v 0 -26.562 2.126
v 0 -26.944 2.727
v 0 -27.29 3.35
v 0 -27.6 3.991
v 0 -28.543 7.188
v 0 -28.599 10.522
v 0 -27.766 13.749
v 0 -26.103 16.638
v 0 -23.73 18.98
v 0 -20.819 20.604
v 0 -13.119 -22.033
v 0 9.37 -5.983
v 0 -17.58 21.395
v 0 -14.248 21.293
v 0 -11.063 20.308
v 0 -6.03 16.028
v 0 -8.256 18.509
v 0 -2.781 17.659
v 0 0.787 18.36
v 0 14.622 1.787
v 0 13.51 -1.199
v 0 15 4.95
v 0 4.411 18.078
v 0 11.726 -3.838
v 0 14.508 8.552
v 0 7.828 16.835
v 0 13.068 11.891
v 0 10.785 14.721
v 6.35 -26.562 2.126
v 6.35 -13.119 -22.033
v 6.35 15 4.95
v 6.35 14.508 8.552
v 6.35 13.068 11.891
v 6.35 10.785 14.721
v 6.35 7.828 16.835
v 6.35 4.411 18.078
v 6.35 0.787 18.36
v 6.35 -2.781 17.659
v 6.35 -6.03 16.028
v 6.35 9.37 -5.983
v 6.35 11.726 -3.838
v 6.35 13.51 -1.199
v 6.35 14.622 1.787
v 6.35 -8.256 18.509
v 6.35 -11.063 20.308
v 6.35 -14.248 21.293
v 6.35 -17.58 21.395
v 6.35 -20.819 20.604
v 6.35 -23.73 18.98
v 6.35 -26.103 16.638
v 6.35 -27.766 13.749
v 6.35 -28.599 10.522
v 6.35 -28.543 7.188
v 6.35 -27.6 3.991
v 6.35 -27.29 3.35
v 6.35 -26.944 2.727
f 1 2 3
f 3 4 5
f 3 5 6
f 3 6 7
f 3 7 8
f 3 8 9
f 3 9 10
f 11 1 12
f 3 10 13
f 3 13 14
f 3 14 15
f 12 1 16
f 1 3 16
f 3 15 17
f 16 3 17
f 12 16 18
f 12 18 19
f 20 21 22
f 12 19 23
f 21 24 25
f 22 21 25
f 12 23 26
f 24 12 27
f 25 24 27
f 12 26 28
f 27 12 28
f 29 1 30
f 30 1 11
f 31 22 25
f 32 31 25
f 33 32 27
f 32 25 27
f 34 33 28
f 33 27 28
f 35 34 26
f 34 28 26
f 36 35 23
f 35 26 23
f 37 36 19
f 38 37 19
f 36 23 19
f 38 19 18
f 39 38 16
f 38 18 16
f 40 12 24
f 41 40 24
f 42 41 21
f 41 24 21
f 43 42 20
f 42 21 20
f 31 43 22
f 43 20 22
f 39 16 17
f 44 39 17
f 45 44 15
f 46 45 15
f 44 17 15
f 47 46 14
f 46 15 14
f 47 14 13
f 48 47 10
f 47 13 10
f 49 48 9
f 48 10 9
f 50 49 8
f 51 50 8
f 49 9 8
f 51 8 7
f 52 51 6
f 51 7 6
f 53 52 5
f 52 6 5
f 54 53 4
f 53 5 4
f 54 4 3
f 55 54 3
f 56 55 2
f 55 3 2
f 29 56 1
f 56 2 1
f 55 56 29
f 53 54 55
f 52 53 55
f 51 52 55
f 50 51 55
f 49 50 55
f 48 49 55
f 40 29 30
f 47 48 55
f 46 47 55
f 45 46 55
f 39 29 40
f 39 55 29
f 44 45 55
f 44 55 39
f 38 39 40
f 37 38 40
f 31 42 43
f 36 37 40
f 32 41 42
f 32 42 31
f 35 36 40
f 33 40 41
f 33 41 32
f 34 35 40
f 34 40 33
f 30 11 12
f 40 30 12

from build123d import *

# Parameters (mm, degrees)
F1_DEPTH = 25.4
F2_SCALE = 0.25


with BuildPart() as f1:
    # F0 (on Right) → F1 (new body)
    with BuildSketch(Plane.YZ):
        with BuildLine():
            ThreePointArc((-110.3992487095, 15.9628562986), (-108.4846328784, 12.1435644545), (-106.2483957789, 8.5032365015))
            Line((-106.2483957789, 8.5032365015), (-110.3992487095, 15.9628562986))
        make_face()
        with BuildLine():
            ThreePointArc((-24.1195932903, 64.1108403944), (-46.0880198127, 31.8647754474), (-40.4449835973, -6.7432109118))
            ThreePointArc((-40.4449835973, -6.7432109118), (-22.2285273136, 11.4155651853), (-15.5582582091, 36.2568199635))
            ThreePointArc((-15.5582582091, 36.2568199635), (-17.7468872986, 50.8268483826), (-24.1195932903, 64.1108403944))
        make_face()
        with BuildLine():
            Line((-52.4756349623, -88.1333723664), (37.4816562158, -23.9329912189))
            ThreePointArc((37.4816562158, -23.9329912189), (-5.3042368908, -32.6670185732), (-40.4449835973, -6.7432109118))
            ThreePointArc((-40.4449835973, -6.7432109118), (-76.3437133157, -12.0550910847), (-106.2483957789, 8.5032365015))
            Line((-106.2483957789, 8.5032365015), (-52.4756349623, -88.1333723664))
        make_face()
        with BuildLine():
            ThreePointArc((-106.2483957789, 8.5032365015), (-76.3437133157, -12.0550910847), (-40.4449835973, -6.7432109118))
            ThreePointArc((-40.4449835973, -6.7432109118), (-46.0880198127, 31.8647754474), (-24.1195932903, 64.1108403944))
            ThreePointArc((-24.1195932903, 64.1108403944), (-89.3162249481, 79.5619391689), (-110.3992487095, 15.9628562986))
            Line((-110.3992487095, 15.9628562986), (-106.2483957789, 8.5032365015))
        make_face()
        with BuildLine():
            ThreePointArc((-40.4449835973, -6.7432109118), (-5.3042368908, -32.6670185732), (37.4816562158, -23.9329912189))
            ThreePointArc((37.4816562158, -23.9329912189), (54.0392417852, -4.7941657865), (59.9991728249, 19.8011081666))
            ThreePointArc((59.9991728249, 19.8011081666), (31.3102321542, 67.3387752918), (-24.1195932903, 64.1108403944))
            ThreePointArc((-24.1195932903, 64.1108403944), (-17.7468872986, 50.8268483826), (-15.5582582091, 36.2568199635))
            ThreePointArc((-15.5582582091, 36.2568199635), (-22.2285273136, 11.4155651853), (-40.4449835973, -6.7432109118))
        make_face()
    extrude(amount=F1_DEPTH)


with BuildPart() as f1_1:
    # F2: moved
    add(f1.part.scale(F2_SCALE))


solid = f1_1.part
